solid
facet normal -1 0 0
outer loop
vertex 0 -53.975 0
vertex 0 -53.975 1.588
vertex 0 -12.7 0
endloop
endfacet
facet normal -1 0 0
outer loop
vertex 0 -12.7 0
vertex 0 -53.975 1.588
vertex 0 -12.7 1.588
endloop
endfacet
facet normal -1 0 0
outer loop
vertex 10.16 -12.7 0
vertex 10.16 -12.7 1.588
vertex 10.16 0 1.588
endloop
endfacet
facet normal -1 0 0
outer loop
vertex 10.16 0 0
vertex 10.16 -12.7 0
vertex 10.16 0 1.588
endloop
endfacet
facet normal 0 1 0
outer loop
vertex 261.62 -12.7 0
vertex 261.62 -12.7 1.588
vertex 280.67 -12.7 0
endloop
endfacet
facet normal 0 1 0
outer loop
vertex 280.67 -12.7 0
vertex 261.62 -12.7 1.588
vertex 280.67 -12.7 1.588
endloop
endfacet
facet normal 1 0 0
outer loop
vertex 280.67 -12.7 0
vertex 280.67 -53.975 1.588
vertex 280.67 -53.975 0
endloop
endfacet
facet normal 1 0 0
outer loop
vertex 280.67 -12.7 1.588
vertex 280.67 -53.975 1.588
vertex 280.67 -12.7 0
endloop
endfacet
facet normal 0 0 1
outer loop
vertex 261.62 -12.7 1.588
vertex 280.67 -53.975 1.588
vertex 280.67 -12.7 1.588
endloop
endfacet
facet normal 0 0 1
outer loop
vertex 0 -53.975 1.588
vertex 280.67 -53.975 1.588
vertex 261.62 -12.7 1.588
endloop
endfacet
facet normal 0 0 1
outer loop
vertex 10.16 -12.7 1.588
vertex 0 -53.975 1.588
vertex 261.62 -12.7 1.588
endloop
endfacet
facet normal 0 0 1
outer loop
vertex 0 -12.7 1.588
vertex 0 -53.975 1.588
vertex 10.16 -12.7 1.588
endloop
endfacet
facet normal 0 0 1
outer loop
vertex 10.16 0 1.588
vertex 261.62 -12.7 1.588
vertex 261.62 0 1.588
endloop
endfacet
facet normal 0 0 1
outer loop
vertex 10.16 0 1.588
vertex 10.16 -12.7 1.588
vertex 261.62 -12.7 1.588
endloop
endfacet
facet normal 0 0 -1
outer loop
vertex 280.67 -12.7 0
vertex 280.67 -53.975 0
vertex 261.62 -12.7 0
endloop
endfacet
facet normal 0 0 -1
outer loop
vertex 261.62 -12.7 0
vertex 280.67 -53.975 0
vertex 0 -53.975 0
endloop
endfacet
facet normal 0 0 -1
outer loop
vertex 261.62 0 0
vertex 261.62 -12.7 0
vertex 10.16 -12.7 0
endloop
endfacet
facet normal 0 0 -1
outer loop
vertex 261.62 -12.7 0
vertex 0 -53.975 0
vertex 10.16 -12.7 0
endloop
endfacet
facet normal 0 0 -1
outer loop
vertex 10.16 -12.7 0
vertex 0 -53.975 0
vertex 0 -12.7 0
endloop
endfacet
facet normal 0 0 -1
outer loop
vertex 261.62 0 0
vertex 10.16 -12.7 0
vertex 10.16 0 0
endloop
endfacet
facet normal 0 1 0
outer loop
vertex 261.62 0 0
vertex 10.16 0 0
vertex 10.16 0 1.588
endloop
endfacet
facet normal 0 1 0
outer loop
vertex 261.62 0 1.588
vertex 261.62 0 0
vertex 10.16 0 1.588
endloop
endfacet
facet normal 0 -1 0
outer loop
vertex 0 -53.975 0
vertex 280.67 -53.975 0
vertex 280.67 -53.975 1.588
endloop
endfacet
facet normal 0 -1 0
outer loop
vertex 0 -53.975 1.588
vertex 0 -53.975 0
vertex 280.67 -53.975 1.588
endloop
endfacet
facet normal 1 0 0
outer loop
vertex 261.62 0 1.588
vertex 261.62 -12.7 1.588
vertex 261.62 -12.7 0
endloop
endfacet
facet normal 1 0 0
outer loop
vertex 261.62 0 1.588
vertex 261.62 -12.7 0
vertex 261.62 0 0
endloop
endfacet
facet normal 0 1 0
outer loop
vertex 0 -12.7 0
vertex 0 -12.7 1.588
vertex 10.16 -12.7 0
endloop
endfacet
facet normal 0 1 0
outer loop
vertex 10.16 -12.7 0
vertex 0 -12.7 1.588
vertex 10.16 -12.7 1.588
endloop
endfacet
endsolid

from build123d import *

# Parameters (mm, degrees)
F0_W     = 53.975
F0_H     = 1.5875
F1_DEPTH = 280.67
F2_W     = 10.16
F2_H     = 12.7
F2_W_2   = 19.05
F3_DEPTH = 25.4


with BuildPart() as f1:
    # F0 (on Right) → F1 (new body)
    with BuildSketch(Plane.YZ):
        with Locations((-26.9875, 0.79375)):
            Rectangle(F0_W, F0_H)
    extrude(amount=F1_DEPTH)

    # F2 (on face) → F3 (cut)
    with BuildSketch(Plane.XY.offset(1.5875)):
        with Locations((5.08, -6.35)):
            Rectangle(F2_W, F2_H)
        with Locations((271.145, -6.35)):
            Rectangle(F2_W_2, F2_H)
    extrude(amount=-F3_DEPTH, mode=Mode.SUBTRACT)


solid = f1.part
